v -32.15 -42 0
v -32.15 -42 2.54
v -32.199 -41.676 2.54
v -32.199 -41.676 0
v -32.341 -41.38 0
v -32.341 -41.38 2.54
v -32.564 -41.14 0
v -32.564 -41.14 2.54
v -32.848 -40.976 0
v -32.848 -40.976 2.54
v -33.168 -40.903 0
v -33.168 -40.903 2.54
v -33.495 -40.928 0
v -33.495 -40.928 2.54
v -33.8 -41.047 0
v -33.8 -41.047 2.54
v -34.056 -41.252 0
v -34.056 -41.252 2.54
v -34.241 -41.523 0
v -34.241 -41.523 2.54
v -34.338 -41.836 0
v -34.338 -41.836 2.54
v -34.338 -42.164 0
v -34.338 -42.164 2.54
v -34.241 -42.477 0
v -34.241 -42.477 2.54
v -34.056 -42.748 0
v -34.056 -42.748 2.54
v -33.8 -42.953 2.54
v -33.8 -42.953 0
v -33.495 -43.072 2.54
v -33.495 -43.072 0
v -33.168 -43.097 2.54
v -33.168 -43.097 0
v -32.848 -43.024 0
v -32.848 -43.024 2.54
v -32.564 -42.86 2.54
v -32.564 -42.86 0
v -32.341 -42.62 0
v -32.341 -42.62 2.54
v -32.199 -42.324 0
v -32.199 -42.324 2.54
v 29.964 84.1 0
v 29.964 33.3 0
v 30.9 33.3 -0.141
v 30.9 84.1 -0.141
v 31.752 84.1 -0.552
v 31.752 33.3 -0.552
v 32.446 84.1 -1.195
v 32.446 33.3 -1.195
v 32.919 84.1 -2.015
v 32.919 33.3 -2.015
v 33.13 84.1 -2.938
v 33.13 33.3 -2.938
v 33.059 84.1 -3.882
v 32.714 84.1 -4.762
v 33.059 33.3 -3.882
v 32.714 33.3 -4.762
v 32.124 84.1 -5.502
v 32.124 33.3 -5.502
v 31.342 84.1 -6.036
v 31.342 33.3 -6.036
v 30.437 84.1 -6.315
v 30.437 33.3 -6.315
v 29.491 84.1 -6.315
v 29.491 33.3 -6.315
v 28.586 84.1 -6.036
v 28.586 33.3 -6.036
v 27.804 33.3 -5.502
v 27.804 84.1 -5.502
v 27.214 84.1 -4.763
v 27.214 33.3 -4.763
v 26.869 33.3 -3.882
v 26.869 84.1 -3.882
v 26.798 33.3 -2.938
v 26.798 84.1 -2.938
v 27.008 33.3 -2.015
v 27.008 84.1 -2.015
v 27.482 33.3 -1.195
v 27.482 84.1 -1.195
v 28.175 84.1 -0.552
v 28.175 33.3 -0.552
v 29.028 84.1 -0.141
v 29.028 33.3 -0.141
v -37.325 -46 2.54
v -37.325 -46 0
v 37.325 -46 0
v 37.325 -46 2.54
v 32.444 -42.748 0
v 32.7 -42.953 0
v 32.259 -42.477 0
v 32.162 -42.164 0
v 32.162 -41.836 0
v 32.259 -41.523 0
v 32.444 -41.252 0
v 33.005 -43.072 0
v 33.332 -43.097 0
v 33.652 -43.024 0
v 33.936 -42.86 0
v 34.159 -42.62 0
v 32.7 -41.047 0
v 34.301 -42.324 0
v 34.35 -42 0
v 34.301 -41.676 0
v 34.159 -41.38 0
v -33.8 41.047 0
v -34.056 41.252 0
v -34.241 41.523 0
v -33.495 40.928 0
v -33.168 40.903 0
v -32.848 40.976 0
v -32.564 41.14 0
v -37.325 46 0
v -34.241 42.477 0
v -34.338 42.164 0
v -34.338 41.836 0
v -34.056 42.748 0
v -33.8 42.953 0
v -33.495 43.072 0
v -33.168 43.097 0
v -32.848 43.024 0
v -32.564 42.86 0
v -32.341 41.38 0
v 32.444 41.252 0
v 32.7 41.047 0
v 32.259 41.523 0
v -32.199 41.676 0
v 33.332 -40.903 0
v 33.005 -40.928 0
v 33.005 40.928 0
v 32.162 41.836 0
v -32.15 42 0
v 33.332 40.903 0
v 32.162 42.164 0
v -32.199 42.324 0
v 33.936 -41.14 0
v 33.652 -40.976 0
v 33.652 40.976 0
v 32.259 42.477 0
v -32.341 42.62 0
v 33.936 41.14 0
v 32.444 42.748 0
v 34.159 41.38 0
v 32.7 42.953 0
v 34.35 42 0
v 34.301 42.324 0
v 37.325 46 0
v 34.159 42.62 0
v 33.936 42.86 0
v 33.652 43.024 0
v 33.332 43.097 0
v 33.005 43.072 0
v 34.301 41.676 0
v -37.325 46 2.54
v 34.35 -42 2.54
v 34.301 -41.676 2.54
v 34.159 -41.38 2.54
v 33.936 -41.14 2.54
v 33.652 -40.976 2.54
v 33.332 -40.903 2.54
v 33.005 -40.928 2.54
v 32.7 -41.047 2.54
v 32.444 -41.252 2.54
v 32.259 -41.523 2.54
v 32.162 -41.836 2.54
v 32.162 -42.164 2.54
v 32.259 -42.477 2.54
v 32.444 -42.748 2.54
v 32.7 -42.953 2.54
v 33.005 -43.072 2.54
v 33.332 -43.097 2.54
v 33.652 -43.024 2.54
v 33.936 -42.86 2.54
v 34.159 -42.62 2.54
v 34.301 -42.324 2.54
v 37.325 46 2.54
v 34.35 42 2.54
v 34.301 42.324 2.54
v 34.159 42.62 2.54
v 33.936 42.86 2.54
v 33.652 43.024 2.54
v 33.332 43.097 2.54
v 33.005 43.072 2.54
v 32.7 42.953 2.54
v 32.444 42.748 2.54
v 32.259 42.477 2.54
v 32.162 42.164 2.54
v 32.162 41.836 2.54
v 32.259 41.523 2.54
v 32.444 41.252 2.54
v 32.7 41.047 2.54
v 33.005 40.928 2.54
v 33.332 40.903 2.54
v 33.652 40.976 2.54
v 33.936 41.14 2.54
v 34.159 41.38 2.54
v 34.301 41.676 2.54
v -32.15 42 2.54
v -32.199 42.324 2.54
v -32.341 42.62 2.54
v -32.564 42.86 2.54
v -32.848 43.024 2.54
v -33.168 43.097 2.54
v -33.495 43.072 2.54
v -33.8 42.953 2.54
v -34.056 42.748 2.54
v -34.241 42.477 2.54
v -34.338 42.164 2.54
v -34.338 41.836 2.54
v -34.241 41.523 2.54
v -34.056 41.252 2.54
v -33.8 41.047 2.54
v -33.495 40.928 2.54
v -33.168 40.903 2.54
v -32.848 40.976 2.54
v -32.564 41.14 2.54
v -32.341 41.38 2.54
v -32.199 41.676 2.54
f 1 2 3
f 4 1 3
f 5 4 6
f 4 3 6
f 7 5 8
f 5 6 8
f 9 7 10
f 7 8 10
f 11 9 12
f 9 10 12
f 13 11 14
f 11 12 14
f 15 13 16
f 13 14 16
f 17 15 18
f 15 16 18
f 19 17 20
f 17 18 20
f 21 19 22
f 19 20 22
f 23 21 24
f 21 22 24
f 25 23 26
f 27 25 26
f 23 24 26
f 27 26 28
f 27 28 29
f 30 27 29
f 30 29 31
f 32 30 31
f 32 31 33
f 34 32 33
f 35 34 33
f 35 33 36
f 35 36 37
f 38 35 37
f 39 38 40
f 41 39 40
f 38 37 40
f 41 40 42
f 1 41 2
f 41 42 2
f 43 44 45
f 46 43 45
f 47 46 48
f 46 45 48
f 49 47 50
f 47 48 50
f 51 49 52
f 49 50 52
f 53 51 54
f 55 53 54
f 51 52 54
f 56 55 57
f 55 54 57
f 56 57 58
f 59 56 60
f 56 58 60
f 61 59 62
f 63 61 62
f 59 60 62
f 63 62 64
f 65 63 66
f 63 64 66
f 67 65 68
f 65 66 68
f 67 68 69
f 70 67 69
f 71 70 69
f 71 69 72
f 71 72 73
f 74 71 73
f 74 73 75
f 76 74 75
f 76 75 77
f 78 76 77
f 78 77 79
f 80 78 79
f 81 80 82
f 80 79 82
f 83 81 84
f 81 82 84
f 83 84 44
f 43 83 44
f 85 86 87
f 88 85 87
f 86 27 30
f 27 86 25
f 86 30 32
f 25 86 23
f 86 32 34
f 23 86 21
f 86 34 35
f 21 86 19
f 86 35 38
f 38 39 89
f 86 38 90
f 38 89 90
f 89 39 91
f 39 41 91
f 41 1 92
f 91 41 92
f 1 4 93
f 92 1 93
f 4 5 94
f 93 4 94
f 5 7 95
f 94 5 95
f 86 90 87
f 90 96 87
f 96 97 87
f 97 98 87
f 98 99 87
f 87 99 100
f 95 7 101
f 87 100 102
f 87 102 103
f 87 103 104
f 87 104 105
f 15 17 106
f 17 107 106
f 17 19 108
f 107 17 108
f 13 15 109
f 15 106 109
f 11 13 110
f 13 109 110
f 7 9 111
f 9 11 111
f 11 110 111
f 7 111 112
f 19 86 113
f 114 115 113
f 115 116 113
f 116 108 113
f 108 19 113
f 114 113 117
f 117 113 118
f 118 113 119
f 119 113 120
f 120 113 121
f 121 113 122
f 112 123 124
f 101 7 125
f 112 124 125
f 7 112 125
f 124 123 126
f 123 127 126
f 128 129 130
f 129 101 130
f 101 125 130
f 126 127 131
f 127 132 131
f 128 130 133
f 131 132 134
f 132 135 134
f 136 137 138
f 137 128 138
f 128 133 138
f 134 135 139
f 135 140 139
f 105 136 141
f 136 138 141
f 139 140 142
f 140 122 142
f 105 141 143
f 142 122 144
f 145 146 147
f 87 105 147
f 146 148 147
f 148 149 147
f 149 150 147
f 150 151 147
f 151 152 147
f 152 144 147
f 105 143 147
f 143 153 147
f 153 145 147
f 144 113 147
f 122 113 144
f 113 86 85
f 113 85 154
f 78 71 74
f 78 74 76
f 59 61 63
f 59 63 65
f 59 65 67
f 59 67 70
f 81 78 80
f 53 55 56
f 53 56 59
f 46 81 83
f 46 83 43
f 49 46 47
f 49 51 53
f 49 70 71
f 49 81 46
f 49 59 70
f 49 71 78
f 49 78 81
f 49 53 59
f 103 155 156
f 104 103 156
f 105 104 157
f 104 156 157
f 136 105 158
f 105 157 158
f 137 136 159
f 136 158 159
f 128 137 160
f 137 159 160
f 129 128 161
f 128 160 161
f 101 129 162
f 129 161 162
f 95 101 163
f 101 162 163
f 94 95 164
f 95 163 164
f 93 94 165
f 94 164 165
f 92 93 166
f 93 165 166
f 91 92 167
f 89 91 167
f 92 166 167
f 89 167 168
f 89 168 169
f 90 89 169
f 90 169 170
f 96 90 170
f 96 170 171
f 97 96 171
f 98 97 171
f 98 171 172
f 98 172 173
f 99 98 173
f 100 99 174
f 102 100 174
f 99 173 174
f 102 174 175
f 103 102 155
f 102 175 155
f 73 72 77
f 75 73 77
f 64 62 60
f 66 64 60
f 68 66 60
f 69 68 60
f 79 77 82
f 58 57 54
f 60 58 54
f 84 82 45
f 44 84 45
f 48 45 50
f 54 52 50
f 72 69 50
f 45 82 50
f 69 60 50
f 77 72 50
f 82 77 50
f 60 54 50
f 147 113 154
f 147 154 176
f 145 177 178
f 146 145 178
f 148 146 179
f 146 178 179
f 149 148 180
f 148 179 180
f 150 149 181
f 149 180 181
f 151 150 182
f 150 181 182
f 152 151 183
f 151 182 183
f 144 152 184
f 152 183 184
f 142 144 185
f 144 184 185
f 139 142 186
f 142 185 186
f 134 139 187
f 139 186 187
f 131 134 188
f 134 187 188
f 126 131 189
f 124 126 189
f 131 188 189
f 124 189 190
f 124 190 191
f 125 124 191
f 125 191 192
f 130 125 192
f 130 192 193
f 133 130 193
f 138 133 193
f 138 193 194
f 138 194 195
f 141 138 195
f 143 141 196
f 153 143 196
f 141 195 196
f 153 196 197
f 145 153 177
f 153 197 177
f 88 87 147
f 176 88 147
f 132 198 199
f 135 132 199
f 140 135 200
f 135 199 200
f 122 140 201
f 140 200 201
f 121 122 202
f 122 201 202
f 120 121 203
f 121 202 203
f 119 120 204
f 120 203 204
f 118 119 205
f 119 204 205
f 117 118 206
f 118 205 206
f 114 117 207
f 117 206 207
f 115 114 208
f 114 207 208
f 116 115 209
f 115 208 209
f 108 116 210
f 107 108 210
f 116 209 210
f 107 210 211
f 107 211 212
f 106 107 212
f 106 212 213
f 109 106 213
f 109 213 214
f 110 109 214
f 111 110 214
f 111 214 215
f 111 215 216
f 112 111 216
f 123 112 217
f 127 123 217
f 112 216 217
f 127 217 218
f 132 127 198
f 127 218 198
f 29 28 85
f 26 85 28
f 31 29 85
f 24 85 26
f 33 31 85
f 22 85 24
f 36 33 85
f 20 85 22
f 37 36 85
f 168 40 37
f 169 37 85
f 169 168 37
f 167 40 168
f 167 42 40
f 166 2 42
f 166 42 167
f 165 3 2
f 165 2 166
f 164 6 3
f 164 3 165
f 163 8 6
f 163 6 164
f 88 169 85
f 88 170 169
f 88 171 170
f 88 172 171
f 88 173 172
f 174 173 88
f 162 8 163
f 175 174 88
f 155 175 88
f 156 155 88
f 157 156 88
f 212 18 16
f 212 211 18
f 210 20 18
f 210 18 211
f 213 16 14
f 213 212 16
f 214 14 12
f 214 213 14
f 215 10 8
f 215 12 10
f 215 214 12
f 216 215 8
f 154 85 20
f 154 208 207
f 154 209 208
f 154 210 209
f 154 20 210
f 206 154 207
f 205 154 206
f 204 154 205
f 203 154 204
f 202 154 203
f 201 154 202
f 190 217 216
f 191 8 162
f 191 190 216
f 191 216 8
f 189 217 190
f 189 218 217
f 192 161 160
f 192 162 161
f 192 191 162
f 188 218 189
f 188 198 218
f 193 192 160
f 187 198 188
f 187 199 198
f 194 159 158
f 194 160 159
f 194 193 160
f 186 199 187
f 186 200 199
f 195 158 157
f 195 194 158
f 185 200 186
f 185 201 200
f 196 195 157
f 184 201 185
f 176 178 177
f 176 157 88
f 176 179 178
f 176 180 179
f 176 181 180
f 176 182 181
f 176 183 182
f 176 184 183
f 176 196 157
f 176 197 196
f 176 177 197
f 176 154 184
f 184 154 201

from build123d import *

# Parameters (mm, degrees)
SKETCH1_W                = 74.65
SKETCH1_H                = 92
BOSS_EXTRUDE1_DEPTH      = 2.54
BOSS_EXTRUDE2_DEPTH      = 38.1
BOSS_EXTRUDE2_DEPTH_BACK = 12.7
SKETCH2_R                = 3.175
SKETCH3_R                = 1.1
CUT_EXTRUDE1_DEPTH       = 2.54


with BuildPart() as part:
    # Sketch1 → Boss-Extrude1 (new body)
    with BuildSketch(Plane.XY):
        Rectangle(SKETCH1_W, SKETCH1_H)
    extrude(amount=BOSS_EXTRUDE1_DEPTH)

    # Sketch3 → Cut-Extrude1 (cut)
    with BuildSketch(Plane.XY.offset(2.54)):
        with Locations((-33.25, 42)):
            Circle(SKETCH3_R)
        with Locations((33.25, 42)):
            Circle(SKETCH3_R)
        with Locations((33.25, -42)):
            Circle(SKETCH3_R)
        with Locations((-33.25, -42)):
            Circle(SKETCH3_R)
    extrude(amount=-CUT_EXTRUDE1_DEPTH, mode=Mode.SUBTRACT)


with BuildPart() as body_2:
    # Sketch2 → Boss-Extrude2 (new, two sides: drawn at the far end of the back side and taken through both)
    with BuildSketch(Plane(origin=(0, 46, 0), x_dir=(1, 0, 0), z_dir=(0, 1, 0)).offset(-BOSS_EXTRUDE2_DEPTH_BACK)):
        with Locations(Location((29.963956952, 3.175, 0), (0, 0, 270))):
            Circle(SKETCH2_R)
    extrude(amount=BOSS_EXTRUDE2_DEPTH + BOSS_EXTRUDE2_DEPTH_BACK)


solid = Compound([part.part, body_2.part])
